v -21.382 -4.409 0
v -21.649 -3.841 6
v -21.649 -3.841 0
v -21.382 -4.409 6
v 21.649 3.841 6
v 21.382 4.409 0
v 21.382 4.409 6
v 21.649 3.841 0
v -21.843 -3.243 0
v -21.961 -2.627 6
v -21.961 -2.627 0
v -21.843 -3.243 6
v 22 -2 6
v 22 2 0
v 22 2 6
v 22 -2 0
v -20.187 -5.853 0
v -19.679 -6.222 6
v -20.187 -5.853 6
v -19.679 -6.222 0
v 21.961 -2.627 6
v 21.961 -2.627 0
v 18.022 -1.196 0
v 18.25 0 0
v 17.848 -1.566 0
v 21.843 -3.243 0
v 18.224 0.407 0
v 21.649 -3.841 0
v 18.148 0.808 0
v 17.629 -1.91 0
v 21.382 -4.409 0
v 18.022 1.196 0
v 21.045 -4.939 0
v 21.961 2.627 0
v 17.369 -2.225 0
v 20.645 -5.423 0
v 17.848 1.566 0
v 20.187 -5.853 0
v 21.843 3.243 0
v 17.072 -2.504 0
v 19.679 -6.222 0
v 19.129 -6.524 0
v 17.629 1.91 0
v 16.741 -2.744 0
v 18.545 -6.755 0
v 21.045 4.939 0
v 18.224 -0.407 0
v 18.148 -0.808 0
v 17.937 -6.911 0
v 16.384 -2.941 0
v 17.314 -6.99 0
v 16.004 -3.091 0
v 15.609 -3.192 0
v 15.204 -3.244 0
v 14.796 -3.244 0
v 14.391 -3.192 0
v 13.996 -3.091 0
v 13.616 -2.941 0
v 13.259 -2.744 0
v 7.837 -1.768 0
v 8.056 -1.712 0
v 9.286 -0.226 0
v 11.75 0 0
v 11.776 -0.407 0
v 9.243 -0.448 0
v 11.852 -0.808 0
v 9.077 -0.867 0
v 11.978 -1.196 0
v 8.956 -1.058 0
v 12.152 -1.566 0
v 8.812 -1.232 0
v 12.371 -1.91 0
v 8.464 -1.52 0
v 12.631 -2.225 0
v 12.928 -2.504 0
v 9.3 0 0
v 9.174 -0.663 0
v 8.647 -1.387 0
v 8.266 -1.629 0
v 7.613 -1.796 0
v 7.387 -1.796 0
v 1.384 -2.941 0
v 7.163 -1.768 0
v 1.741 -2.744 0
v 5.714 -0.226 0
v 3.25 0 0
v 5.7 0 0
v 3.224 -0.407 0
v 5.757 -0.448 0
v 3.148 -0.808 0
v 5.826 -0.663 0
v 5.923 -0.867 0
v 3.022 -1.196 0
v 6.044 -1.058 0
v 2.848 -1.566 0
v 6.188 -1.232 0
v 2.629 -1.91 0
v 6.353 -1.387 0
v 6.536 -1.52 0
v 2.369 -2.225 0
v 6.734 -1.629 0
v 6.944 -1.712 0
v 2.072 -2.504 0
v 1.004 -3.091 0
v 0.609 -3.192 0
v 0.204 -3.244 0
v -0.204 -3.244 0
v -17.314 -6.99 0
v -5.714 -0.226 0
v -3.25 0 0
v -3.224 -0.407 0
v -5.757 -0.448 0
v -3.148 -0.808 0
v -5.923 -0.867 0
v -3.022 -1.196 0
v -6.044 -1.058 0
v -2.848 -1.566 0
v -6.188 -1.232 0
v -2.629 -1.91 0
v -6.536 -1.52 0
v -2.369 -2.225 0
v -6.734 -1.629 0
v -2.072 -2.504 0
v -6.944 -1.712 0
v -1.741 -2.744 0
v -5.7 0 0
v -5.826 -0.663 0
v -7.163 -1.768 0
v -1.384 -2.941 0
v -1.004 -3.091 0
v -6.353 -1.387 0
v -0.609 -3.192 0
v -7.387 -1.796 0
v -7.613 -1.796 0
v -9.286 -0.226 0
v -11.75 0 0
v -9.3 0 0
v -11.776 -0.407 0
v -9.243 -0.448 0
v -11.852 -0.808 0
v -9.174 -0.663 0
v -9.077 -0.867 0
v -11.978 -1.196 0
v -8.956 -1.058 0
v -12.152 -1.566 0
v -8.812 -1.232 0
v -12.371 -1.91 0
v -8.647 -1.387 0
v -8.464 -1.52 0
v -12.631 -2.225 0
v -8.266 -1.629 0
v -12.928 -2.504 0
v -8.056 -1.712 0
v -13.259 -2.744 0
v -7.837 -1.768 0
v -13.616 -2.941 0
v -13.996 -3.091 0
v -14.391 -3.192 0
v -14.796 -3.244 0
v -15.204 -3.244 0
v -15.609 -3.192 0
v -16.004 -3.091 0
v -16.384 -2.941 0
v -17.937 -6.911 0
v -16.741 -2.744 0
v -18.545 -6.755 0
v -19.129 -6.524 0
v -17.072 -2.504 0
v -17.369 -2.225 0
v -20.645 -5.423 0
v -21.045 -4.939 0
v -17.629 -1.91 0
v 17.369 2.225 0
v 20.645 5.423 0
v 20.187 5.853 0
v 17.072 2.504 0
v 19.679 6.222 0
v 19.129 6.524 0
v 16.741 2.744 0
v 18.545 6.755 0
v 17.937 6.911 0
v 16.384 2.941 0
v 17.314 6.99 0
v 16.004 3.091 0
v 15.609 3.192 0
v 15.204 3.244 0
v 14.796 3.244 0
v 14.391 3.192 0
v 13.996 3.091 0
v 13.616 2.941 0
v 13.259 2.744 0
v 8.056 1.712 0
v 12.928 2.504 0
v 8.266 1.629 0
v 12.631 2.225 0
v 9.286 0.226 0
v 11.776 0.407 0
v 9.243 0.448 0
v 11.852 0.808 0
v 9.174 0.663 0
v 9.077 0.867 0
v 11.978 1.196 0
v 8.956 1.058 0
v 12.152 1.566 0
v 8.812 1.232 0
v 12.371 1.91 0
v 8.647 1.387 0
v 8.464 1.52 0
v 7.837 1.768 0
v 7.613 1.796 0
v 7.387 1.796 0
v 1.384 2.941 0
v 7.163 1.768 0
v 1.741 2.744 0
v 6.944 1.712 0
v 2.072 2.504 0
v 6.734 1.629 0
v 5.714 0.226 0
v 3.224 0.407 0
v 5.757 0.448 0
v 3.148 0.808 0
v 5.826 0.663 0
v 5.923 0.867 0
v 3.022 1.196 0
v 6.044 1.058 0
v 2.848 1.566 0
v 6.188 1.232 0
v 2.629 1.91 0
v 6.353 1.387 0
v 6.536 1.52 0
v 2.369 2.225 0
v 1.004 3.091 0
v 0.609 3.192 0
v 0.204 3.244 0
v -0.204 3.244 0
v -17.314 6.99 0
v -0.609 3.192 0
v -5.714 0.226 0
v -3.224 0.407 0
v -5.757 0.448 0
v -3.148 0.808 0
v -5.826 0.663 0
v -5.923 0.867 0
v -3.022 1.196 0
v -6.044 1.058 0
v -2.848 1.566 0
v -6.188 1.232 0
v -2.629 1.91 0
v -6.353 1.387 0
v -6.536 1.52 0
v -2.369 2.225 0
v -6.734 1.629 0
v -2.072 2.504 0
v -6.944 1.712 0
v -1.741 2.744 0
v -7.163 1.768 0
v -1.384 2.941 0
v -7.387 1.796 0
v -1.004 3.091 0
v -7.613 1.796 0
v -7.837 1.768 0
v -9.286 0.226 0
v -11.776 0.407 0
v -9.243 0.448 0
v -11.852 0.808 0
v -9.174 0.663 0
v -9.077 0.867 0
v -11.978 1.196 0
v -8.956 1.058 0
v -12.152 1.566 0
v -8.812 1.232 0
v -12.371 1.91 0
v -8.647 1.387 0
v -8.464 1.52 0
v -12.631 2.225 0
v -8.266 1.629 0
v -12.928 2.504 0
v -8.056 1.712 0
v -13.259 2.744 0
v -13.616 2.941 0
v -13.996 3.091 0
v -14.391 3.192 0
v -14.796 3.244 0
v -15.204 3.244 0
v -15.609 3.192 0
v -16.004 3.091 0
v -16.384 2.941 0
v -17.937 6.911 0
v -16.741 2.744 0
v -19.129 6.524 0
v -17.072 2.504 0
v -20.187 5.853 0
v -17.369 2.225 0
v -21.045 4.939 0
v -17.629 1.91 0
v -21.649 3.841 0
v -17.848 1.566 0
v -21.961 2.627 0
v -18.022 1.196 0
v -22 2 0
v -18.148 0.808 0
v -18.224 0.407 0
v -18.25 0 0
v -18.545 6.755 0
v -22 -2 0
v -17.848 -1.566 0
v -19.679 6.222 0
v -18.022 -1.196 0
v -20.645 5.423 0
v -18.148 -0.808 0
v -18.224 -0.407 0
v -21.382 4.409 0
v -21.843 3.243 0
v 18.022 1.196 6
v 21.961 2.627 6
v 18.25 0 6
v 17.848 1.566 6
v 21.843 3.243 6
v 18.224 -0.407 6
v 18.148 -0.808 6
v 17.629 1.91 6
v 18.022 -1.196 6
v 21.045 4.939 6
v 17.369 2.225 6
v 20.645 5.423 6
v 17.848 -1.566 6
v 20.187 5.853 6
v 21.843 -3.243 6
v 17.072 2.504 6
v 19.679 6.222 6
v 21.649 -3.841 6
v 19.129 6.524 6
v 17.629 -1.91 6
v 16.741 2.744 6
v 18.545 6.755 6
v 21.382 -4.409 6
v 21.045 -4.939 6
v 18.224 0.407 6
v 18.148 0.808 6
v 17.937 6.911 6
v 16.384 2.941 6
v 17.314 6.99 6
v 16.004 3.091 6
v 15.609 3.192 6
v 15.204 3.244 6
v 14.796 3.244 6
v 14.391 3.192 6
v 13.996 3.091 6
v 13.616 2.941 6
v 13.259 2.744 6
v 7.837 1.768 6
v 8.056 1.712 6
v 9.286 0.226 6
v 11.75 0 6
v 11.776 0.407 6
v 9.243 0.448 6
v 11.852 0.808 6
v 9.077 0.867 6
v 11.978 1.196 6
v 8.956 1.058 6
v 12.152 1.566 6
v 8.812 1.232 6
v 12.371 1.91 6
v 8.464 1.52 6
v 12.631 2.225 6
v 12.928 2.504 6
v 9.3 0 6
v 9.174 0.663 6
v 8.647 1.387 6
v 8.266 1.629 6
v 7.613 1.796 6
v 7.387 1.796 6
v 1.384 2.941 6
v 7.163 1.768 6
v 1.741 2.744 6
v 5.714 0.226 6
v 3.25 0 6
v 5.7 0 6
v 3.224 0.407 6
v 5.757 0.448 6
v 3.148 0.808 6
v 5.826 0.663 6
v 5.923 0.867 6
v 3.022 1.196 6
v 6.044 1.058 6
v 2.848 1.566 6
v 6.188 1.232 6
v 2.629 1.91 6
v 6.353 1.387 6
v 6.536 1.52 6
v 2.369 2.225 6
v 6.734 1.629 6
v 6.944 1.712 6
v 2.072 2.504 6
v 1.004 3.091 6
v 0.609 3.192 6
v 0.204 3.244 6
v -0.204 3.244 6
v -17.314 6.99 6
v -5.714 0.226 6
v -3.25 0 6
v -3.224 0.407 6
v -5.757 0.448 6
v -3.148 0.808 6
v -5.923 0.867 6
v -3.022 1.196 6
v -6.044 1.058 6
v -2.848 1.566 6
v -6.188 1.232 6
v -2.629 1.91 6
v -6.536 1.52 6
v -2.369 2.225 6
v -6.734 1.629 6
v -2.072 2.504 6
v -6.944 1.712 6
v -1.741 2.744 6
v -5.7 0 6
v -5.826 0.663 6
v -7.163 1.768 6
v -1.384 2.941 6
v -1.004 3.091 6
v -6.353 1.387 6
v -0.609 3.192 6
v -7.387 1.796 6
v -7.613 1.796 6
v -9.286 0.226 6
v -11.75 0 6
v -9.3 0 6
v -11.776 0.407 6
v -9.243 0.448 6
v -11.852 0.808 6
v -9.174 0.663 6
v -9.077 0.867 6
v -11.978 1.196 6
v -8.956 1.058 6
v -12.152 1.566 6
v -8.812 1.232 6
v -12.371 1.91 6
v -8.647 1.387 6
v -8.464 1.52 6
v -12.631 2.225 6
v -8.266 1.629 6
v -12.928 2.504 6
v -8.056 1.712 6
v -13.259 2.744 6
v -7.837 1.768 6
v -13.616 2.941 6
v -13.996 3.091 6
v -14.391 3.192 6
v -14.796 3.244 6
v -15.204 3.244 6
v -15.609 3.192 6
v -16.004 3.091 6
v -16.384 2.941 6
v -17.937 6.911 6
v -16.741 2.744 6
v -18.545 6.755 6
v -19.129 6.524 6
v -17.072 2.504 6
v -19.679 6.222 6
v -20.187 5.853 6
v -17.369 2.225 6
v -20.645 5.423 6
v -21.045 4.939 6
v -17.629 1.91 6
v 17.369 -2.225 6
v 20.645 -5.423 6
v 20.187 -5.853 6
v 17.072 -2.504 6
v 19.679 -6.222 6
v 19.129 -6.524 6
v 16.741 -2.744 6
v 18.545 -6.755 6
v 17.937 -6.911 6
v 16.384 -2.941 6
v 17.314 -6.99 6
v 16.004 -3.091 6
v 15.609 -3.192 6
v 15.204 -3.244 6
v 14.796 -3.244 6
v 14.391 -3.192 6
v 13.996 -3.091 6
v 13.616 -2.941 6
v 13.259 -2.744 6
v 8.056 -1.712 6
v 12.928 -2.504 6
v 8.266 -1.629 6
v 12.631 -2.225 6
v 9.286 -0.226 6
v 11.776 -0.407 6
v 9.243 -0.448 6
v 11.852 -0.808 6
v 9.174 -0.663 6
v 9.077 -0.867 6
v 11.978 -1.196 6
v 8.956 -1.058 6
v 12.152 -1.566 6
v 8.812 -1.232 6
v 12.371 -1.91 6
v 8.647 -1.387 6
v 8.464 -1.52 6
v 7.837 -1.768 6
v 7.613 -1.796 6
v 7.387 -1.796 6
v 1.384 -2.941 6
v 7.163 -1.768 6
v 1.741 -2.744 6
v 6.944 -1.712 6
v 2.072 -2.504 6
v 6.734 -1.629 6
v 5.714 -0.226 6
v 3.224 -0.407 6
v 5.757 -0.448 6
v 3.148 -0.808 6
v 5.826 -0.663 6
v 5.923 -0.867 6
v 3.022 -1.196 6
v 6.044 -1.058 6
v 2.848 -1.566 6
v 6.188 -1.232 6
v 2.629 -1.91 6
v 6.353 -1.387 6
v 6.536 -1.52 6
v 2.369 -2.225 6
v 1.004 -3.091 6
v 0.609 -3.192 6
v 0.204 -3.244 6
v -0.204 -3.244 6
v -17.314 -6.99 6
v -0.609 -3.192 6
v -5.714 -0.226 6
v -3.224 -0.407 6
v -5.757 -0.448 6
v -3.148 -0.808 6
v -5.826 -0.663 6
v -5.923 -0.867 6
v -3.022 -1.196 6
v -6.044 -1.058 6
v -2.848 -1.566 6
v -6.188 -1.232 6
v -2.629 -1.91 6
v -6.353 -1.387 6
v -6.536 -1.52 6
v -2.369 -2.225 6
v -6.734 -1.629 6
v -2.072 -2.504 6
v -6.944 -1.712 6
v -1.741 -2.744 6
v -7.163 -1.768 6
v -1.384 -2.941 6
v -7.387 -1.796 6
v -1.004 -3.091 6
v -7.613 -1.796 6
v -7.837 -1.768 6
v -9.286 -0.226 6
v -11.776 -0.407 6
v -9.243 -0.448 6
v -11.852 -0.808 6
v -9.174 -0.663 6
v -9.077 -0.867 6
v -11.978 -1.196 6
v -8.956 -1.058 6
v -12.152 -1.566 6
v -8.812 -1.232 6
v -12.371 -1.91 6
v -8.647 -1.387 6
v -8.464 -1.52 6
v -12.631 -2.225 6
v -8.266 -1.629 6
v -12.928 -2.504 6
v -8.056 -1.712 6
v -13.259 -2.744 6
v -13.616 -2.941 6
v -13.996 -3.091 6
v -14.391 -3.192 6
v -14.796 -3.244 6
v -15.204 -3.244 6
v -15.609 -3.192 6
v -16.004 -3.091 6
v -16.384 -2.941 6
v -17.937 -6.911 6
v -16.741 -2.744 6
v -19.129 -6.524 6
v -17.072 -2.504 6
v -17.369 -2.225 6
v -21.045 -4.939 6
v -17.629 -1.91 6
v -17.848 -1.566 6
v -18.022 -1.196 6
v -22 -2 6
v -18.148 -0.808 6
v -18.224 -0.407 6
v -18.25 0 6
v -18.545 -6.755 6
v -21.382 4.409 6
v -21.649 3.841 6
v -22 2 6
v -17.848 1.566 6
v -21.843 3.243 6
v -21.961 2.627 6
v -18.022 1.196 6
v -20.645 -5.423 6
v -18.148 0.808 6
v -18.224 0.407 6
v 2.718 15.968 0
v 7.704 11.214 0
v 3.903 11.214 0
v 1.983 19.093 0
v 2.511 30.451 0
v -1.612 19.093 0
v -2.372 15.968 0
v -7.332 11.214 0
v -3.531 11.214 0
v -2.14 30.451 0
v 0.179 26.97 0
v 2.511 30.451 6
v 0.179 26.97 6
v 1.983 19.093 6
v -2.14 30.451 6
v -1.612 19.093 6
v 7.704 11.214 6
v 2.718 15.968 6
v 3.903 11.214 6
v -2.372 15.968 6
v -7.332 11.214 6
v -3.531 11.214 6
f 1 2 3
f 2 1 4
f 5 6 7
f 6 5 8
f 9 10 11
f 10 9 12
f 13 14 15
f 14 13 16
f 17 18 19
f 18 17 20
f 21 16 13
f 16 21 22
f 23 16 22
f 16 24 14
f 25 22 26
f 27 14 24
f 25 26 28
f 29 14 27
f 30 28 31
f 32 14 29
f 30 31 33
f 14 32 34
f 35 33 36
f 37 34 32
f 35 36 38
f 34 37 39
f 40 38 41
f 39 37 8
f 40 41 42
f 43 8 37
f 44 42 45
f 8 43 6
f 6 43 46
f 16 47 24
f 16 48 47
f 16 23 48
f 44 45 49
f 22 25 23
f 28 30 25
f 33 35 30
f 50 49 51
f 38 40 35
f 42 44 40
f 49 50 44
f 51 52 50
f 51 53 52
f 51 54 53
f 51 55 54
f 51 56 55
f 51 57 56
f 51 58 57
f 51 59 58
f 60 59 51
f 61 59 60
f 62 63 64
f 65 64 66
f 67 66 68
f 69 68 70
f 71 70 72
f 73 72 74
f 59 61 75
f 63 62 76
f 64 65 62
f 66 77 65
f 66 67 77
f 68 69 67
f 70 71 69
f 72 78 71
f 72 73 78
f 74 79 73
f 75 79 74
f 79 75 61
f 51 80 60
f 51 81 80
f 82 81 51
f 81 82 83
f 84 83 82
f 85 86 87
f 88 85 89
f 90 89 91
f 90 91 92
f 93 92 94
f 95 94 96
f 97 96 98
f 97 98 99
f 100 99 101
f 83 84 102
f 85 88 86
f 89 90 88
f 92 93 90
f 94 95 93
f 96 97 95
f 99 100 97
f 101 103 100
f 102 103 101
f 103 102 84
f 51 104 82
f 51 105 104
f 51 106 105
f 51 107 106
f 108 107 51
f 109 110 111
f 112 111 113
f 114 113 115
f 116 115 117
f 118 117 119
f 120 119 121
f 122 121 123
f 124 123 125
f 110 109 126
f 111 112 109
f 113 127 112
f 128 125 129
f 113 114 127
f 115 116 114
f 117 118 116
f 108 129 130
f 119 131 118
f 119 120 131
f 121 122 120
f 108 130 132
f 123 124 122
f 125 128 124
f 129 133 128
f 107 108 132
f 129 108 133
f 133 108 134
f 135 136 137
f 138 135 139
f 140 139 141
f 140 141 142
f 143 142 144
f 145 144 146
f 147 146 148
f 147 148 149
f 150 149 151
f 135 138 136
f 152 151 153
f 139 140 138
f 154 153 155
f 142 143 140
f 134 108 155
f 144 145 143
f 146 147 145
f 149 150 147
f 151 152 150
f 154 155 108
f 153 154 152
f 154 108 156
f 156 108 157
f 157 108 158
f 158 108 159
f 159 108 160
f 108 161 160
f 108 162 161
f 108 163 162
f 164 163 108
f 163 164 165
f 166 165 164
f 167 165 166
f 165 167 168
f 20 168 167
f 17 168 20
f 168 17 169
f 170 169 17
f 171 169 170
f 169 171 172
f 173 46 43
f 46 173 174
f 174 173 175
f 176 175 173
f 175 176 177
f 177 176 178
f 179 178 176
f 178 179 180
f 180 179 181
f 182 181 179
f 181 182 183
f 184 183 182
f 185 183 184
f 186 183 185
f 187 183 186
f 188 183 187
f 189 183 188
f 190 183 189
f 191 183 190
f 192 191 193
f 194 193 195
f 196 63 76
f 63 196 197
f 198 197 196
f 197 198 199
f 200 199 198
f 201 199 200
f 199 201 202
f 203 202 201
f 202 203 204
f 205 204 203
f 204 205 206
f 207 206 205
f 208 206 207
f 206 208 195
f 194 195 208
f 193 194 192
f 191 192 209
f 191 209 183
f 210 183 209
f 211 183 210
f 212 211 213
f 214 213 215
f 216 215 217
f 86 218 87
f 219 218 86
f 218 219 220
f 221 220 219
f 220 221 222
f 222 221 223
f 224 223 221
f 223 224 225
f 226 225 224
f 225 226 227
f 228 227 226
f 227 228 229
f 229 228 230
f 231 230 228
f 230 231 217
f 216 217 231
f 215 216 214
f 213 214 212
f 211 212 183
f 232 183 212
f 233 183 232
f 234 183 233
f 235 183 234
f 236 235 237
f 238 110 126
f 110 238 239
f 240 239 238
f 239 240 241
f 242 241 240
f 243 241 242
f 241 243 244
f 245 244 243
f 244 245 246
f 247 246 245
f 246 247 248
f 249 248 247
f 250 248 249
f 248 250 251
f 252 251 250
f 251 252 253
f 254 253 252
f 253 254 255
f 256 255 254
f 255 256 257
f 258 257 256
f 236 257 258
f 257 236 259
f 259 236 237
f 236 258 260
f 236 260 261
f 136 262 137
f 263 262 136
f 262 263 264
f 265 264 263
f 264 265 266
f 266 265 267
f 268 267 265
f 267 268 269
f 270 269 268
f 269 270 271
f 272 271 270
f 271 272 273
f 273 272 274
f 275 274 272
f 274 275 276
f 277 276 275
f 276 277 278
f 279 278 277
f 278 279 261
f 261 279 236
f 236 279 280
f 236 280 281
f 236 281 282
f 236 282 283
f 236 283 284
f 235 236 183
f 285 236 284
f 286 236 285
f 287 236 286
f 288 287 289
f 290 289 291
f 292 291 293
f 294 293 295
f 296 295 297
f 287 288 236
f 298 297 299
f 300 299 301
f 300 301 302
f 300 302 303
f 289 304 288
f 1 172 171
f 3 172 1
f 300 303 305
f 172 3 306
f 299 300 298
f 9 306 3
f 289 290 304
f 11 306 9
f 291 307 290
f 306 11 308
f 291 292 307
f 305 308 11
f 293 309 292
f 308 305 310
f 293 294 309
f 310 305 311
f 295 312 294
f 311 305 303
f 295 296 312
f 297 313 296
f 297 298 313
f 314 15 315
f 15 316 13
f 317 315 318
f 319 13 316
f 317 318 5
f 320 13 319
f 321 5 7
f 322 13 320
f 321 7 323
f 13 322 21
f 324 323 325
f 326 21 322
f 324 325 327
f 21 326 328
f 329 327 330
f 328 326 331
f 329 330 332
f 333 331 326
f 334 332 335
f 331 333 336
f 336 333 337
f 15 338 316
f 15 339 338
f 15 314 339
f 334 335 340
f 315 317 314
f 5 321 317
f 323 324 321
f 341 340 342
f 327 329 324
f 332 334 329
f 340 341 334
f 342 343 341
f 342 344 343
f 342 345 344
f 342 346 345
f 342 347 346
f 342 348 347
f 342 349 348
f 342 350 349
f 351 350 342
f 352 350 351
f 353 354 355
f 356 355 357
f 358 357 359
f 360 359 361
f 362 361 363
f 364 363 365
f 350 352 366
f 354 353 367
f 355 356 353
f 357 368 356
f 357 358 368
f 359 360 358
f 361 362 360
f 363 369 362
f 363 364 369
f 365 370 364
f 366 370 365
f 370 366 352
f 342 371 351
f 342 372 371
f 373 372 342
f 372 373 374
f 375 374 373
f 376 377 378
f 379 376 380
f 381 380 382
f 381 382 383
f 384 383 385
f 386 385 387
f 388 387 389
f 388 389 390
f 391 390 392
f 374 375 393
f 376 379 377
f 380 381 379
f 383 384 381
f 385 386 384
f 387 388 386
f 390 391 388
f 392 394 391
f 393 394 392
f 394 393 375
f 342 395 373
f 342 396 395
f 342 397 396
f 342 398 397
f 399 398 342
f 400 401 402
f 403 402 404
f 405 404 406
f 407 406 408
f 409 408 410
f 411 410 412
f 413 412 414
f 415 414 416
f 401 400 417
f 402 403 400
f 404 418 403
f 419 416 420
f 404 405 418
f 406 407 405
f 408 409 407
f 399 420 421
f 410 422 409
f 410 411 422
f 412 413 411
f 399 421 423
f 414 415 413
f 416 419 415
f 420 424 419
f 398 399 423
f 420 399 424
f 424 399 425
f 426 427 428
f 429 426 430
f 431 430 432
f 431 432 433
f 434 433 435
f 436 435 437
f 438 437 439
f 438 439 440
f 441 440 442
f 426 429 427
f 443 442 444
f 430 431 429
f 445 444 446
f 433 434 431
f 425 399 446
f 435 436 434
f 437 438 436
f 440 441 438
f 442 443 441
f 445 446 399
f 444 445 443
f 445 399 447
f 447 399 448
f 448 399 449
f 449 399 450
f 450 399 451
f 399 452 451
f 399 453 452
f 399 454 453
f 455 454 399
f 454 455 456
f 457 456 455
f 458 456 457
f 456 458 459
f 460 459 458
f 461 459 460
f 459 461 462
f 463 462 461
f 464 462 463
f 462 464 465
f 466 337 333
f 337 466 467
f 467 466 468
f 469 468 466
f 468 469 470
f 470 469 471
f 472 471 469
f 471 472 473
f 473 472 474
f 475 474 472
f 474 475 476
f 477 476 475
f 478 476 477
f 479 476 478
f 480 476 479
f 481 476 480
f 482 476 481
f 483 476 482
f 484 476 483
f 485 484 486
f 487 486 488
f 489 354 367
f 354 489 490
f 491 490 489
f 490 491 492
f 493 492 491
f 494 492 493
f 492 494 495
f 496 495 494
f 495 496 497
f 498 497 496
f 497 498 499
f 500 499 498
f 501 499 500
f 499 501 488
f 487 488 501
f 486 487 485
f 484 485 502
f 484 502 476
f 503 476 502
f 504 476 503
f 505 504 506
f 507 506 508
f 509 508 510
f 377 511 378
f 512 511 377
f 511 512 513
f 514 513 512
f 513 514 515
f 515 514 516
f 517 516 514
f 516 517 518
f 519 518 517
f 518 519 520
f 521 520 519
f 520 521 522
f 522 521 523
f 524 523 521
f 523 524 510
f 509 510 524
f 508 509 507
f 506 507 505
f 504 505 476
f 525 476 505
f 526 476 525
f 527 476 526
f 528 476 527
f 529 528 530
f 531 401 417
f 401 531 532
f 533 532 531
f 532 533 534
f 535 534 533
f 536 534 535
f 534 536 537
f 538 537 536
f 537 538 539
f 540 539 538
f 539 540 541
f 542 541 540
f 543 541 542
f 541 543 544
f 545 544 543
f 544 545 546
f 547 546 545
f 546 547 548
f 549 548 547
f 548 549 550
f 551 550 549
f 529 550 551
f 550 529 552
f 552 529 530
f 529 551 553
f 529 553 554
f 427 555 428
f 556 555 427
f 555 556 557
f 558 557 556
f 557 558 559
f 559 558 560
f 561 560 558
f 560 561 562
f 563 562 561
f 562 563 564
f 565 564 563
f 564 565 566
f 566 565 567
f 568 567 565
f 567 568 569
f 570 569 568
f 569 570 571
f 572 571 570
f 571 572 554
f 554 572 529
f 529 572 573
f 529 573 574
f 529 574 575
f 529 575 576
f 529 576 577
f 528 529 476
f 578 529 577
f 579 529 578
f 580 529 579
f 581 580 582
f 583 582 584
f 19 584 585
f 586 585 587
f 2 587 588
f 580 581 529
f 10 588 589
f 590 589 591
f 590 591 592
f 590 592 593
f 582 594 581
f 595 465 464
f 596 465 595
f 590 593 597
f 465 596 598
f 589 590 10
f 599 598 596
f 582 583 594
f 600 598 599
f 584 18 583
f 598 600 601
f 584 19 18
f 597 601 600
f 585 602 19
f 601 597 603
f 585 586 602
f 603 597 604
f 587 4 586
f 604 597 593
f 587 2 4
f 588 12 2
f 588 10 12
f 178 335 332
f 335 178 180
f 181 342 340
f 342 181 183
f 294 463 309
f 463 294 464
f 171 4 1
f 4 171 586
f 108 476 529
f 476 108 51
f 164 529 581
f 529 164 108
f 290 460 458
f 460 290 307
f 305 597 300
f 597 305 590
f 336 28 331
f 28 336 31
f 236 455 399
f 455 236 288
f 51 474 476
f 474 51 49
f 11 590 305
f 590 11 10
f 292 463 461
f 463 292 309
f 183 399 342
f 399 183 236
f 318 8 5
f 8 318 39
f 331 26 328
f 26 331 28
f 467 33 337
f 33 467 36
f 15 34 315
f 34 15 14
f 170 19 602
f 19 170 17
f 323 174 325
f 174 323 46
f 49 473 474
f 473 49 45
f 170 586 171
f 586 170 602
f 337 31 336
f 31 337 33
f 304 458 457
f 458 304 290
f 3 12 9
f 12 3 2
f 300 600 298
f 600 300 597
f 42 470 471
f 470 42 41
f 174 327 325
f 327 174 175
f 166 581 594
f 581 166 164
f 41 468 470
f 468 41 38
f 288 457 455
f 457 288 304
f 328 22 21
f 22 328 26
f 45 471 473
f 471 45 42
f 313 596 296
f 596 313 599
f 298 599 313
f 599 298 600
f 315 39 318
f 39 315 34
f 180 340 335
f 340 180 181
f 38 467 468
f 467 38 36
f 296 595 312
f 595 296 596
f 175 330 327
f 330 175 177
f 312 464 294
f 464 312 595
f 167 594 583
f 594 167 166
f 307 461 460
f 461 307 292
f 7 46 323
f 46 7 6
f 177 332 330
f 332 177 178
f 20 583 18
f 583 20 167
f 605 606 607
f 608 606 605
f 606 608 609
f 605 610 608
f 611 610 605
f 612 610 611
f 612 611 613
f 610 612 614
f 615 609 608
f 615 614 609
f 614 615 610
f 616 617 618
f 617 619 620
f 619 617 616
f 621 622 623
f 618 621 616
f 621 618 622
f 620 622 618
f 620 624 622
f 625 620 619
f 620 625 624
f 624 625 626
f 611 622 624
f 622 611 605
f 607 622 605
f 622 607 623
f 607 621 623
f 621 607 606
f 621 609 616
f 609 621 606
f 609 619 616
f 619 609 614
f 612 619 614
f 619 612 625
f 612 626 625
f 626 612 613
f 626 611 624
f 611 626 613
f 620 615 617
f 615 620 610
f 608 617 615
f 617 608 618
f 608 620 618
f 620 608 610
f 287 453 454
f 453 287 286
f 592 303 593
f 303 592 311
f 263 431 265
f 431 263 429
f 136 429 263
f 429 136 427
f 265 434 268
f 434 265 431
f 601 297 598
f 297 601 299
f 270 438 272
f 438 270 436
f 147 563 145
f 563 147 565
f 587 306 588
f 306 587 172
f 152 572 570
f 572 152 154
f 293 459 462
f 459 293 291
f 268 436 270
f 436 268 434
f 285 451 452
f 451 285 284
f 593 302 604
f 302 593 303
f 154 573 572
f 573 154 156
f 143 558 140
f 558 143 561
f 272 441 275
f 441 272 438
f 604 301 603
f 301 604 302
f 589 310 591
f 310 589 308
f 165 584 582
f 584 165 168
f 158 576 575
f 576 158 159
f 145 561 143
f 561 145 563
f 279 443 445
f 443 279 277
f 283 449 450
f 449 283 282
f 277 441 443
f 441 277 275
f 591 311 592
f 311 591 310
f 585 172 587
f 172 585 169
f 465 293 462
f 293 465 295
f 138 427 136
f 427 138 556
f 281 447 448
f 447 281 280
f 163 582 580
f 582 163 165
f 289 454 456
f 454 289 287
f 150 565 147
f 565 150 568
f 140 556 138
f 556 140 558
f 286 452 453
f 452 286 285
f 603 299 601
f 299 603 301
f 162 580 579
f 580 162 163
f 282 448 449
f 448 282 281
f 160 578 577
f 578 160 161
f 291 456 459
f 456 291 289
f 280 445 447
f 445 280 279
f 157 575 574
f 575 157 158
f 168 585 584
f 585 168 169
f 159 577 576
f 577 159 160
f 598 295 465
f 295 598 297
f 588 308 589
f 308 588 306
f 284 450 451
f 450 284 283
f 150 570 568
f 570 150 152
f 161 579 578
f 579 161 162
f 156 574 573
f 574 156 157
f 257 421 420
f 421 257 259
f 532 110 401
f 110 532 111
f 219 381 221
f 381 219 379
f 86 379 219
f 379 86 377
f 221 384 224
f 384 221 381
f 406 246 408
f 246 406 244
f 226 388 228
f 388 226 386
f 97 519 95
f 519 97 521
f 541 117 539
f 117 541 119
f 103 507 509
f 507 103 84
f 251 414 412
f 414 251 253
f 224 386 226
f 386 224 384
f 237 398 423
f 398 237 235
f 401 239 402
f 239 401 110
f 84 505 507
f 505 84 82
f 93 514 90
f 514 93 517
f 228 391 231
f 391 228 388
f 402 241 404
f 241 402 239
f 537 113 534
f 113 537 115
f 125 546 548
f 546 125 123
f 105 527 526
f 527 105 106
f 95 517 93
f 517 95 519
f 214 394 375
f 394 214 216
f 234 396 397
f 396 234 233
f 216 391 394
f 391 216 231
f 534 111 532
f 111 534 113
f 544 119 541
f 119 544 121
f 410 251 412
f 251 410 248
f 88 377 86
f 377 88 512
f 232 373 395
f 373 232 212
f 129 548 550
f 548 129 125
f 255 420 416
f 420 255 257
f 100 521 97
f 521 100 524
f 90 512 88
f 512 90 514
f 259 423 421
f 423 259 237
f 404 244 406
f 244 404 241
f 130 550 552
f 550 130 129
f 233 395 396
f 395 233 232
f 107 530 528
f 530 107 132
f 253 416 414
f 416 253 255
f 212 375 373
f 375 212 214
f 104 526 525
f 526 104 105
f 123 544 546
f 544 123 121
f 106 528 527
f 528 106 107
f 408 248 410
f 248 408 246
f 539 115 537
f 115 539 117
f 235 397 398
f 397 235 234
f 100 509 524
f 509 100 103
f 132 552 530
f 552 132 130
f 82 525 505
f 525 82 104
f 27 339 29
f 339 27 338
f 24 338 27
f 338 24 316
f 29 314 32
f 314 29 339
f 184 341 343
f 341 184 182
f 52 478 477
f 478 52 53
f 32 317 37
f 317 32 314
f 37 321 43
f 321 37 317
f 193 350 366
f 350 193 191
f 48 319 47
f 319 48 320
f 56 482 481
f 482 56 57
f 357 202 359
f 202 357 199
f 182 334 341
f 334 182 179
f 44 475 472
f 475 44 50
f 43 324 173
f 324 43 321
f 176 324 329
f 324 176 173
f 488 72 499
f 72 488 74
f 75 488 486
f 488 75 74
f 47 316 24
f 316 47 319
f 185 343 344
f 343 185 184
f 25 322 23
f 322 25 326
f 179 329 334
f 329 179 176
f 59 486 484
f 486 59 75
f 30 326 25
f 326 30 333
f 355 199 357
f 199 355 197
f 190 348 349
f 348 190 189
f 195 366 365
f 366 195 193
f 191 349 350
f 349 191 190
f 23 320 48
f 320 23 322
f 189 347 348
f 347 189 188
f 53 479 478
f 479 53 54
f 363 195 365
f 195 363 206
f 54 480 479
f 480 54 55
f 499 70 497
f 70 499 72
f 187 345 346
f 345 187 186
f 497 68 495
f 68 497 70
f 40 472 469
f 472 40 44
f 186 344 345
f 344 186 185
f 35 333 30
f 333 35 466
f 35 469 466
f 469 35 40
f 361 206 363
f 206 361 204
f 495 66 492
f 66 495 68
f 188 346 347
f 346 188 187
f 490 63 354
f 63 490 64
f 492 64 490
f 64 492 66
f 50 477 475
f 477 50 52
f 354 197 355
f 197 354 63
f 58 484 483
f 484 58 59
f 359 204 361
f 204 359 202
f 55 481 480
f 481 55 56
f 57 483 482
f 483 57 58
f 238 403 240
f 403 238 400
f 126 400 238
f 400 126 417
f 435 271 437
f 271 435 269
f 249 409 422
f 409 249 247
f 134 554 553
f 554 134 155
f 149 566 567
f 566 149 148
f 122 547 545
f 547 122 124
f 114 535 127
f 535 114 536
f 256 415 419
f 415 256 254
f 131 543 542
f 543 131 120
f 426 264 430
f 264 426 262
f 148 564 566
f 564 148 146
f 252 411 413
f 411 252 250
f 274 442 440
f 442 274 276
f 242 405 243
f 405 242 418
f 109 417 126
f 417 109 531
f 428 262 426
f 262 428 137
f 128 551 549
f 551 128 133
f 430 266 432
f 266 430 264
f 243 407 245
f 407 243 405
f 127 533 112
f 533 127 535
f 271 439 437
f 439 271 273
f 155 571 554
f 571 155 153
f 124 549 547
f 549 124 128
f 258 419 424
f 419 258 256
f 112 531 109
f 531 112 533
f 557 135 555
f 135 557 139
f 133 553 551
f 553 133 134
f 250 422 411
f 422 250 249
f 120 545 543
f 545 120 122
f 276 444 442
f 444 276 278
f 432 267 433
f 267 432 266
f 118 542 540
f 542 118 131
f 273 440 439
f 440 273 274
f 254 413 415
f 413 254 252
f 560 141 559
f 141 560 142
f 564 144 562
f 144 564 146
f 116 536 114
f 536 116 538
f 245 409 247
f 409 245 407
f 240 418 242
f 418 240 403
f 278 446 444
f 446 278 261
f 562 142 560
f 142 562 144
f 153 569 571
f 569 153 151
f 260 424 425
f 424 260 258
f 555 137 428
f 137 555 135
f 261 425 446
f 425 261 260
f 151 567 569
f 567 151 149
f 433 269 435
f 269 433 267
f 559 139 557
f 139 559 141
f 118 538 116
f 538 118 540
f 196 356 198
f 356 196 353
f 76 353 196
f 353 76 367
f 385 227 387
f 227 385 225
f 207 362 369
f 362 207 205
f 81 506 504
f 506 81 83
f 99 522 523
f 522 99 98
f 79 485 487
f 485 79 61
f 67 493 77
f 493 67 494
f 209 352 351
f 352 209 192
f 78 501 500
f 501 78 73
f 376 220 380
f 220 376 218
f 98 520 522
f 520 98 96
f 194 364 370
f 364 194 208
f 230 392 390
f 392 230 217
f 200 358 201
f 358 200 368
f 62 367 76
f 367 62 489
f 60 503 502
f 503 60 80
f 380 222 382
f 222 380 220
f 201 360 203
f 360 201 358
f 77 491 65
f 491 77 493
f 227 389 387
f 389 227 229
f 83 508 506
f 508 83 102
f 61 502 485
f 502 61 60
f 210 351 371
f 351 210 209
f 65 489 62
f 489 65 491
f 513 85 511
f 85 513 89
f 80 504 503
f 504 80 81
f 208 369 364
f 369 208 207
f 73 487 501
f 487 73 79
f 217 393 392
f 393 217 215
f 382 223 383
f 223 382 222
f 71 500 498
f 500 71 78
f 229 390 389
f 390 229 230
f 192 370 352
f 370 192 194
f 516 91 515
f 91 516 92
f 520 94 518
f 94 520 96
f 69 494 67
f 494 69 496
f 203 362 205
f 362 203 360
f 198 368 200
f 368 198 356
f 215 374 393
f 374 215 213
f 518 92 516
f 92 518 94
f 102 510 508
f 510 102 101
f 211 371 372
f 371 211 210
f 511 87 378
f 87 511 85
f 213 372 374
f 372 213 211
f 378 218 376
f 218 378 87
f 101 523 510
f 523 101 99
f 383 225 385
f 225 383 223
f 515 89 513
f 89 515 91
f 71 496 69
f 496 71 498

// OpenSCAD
$fn = 50;


difference() {
	union() {
		hull() {
			translate(v = [-17.0000000000, 2.0000000000, 0]) {
				cylinder(h = 6, r = 5);
			}
			translate(v = [17.0000000000, 2.0000000000, 0]) {
				cylinder(h = 6, r = 5);
			}
			translate(v = [-17.0000000000, -2.0000000000, 0]) {
				cylinder(h = 6, r = 5);
			}
			translate(v = [17.0000000000, -2.0000000000, 0]) {
				cylinder(h = 6, r = 5);
			}
		}
		translate(v = [0, 30.0000000000, 0]) {
			linear_extrude(height = 6) {
				text(font = "DejaVu Sans Mono:style=Bold", halign = "center", size = 19.0000000000, text = "A", valign = "top");
			}
		}
	}
	union() {
		translate(v = [-15.0000000000, 0.0000000000, 0]) {
			translate(v = [0, 0, -100]) {
				cylinder(h = 200, r = 3.2500000000);
			}
		}
		translate(v = [0, 0, -100]) {
			cylinder(h = 200, r = 3.2500000000);
		}
		translate(v = [15.0000000000, 0.0000000000, 0]) {
			translate(v = [0, 0, -100]) {
				cylinder(h = 200, r = 3.2500000000);
			}
		}
		translate(v = [-15.0000000000, 0.0000000000, 0]) {
			translate(v = [0, 0, -100]) {
				cylinder(h = 200, r = 1.8000000000);
			}
		}
		translate(v = [-7.5000000000, 0.0000000000, 0]) {
			translate(v = [0, 0, -100]) {
				cylinder(h = 200, r = 1.8000000000);
			}
		}
		translate(v = [0, 0, -100]) {
			cylinder(h = 200, r = 1.8000000000);
		}
		translate(v = [7.5000000000, 0.0000000000, 0]) {
			translate(v = [0, 0, -100]) {
				cylinder(h = 200, r = 1.8000000000);
			}
		}
		translate(v = [15.0000000000, 0.0000000000, 0]) {
			translate(v = [0, 0, -100]) {
				cylinder(h = 200, r = 1.8000000000);
			}
		}
	}
}
